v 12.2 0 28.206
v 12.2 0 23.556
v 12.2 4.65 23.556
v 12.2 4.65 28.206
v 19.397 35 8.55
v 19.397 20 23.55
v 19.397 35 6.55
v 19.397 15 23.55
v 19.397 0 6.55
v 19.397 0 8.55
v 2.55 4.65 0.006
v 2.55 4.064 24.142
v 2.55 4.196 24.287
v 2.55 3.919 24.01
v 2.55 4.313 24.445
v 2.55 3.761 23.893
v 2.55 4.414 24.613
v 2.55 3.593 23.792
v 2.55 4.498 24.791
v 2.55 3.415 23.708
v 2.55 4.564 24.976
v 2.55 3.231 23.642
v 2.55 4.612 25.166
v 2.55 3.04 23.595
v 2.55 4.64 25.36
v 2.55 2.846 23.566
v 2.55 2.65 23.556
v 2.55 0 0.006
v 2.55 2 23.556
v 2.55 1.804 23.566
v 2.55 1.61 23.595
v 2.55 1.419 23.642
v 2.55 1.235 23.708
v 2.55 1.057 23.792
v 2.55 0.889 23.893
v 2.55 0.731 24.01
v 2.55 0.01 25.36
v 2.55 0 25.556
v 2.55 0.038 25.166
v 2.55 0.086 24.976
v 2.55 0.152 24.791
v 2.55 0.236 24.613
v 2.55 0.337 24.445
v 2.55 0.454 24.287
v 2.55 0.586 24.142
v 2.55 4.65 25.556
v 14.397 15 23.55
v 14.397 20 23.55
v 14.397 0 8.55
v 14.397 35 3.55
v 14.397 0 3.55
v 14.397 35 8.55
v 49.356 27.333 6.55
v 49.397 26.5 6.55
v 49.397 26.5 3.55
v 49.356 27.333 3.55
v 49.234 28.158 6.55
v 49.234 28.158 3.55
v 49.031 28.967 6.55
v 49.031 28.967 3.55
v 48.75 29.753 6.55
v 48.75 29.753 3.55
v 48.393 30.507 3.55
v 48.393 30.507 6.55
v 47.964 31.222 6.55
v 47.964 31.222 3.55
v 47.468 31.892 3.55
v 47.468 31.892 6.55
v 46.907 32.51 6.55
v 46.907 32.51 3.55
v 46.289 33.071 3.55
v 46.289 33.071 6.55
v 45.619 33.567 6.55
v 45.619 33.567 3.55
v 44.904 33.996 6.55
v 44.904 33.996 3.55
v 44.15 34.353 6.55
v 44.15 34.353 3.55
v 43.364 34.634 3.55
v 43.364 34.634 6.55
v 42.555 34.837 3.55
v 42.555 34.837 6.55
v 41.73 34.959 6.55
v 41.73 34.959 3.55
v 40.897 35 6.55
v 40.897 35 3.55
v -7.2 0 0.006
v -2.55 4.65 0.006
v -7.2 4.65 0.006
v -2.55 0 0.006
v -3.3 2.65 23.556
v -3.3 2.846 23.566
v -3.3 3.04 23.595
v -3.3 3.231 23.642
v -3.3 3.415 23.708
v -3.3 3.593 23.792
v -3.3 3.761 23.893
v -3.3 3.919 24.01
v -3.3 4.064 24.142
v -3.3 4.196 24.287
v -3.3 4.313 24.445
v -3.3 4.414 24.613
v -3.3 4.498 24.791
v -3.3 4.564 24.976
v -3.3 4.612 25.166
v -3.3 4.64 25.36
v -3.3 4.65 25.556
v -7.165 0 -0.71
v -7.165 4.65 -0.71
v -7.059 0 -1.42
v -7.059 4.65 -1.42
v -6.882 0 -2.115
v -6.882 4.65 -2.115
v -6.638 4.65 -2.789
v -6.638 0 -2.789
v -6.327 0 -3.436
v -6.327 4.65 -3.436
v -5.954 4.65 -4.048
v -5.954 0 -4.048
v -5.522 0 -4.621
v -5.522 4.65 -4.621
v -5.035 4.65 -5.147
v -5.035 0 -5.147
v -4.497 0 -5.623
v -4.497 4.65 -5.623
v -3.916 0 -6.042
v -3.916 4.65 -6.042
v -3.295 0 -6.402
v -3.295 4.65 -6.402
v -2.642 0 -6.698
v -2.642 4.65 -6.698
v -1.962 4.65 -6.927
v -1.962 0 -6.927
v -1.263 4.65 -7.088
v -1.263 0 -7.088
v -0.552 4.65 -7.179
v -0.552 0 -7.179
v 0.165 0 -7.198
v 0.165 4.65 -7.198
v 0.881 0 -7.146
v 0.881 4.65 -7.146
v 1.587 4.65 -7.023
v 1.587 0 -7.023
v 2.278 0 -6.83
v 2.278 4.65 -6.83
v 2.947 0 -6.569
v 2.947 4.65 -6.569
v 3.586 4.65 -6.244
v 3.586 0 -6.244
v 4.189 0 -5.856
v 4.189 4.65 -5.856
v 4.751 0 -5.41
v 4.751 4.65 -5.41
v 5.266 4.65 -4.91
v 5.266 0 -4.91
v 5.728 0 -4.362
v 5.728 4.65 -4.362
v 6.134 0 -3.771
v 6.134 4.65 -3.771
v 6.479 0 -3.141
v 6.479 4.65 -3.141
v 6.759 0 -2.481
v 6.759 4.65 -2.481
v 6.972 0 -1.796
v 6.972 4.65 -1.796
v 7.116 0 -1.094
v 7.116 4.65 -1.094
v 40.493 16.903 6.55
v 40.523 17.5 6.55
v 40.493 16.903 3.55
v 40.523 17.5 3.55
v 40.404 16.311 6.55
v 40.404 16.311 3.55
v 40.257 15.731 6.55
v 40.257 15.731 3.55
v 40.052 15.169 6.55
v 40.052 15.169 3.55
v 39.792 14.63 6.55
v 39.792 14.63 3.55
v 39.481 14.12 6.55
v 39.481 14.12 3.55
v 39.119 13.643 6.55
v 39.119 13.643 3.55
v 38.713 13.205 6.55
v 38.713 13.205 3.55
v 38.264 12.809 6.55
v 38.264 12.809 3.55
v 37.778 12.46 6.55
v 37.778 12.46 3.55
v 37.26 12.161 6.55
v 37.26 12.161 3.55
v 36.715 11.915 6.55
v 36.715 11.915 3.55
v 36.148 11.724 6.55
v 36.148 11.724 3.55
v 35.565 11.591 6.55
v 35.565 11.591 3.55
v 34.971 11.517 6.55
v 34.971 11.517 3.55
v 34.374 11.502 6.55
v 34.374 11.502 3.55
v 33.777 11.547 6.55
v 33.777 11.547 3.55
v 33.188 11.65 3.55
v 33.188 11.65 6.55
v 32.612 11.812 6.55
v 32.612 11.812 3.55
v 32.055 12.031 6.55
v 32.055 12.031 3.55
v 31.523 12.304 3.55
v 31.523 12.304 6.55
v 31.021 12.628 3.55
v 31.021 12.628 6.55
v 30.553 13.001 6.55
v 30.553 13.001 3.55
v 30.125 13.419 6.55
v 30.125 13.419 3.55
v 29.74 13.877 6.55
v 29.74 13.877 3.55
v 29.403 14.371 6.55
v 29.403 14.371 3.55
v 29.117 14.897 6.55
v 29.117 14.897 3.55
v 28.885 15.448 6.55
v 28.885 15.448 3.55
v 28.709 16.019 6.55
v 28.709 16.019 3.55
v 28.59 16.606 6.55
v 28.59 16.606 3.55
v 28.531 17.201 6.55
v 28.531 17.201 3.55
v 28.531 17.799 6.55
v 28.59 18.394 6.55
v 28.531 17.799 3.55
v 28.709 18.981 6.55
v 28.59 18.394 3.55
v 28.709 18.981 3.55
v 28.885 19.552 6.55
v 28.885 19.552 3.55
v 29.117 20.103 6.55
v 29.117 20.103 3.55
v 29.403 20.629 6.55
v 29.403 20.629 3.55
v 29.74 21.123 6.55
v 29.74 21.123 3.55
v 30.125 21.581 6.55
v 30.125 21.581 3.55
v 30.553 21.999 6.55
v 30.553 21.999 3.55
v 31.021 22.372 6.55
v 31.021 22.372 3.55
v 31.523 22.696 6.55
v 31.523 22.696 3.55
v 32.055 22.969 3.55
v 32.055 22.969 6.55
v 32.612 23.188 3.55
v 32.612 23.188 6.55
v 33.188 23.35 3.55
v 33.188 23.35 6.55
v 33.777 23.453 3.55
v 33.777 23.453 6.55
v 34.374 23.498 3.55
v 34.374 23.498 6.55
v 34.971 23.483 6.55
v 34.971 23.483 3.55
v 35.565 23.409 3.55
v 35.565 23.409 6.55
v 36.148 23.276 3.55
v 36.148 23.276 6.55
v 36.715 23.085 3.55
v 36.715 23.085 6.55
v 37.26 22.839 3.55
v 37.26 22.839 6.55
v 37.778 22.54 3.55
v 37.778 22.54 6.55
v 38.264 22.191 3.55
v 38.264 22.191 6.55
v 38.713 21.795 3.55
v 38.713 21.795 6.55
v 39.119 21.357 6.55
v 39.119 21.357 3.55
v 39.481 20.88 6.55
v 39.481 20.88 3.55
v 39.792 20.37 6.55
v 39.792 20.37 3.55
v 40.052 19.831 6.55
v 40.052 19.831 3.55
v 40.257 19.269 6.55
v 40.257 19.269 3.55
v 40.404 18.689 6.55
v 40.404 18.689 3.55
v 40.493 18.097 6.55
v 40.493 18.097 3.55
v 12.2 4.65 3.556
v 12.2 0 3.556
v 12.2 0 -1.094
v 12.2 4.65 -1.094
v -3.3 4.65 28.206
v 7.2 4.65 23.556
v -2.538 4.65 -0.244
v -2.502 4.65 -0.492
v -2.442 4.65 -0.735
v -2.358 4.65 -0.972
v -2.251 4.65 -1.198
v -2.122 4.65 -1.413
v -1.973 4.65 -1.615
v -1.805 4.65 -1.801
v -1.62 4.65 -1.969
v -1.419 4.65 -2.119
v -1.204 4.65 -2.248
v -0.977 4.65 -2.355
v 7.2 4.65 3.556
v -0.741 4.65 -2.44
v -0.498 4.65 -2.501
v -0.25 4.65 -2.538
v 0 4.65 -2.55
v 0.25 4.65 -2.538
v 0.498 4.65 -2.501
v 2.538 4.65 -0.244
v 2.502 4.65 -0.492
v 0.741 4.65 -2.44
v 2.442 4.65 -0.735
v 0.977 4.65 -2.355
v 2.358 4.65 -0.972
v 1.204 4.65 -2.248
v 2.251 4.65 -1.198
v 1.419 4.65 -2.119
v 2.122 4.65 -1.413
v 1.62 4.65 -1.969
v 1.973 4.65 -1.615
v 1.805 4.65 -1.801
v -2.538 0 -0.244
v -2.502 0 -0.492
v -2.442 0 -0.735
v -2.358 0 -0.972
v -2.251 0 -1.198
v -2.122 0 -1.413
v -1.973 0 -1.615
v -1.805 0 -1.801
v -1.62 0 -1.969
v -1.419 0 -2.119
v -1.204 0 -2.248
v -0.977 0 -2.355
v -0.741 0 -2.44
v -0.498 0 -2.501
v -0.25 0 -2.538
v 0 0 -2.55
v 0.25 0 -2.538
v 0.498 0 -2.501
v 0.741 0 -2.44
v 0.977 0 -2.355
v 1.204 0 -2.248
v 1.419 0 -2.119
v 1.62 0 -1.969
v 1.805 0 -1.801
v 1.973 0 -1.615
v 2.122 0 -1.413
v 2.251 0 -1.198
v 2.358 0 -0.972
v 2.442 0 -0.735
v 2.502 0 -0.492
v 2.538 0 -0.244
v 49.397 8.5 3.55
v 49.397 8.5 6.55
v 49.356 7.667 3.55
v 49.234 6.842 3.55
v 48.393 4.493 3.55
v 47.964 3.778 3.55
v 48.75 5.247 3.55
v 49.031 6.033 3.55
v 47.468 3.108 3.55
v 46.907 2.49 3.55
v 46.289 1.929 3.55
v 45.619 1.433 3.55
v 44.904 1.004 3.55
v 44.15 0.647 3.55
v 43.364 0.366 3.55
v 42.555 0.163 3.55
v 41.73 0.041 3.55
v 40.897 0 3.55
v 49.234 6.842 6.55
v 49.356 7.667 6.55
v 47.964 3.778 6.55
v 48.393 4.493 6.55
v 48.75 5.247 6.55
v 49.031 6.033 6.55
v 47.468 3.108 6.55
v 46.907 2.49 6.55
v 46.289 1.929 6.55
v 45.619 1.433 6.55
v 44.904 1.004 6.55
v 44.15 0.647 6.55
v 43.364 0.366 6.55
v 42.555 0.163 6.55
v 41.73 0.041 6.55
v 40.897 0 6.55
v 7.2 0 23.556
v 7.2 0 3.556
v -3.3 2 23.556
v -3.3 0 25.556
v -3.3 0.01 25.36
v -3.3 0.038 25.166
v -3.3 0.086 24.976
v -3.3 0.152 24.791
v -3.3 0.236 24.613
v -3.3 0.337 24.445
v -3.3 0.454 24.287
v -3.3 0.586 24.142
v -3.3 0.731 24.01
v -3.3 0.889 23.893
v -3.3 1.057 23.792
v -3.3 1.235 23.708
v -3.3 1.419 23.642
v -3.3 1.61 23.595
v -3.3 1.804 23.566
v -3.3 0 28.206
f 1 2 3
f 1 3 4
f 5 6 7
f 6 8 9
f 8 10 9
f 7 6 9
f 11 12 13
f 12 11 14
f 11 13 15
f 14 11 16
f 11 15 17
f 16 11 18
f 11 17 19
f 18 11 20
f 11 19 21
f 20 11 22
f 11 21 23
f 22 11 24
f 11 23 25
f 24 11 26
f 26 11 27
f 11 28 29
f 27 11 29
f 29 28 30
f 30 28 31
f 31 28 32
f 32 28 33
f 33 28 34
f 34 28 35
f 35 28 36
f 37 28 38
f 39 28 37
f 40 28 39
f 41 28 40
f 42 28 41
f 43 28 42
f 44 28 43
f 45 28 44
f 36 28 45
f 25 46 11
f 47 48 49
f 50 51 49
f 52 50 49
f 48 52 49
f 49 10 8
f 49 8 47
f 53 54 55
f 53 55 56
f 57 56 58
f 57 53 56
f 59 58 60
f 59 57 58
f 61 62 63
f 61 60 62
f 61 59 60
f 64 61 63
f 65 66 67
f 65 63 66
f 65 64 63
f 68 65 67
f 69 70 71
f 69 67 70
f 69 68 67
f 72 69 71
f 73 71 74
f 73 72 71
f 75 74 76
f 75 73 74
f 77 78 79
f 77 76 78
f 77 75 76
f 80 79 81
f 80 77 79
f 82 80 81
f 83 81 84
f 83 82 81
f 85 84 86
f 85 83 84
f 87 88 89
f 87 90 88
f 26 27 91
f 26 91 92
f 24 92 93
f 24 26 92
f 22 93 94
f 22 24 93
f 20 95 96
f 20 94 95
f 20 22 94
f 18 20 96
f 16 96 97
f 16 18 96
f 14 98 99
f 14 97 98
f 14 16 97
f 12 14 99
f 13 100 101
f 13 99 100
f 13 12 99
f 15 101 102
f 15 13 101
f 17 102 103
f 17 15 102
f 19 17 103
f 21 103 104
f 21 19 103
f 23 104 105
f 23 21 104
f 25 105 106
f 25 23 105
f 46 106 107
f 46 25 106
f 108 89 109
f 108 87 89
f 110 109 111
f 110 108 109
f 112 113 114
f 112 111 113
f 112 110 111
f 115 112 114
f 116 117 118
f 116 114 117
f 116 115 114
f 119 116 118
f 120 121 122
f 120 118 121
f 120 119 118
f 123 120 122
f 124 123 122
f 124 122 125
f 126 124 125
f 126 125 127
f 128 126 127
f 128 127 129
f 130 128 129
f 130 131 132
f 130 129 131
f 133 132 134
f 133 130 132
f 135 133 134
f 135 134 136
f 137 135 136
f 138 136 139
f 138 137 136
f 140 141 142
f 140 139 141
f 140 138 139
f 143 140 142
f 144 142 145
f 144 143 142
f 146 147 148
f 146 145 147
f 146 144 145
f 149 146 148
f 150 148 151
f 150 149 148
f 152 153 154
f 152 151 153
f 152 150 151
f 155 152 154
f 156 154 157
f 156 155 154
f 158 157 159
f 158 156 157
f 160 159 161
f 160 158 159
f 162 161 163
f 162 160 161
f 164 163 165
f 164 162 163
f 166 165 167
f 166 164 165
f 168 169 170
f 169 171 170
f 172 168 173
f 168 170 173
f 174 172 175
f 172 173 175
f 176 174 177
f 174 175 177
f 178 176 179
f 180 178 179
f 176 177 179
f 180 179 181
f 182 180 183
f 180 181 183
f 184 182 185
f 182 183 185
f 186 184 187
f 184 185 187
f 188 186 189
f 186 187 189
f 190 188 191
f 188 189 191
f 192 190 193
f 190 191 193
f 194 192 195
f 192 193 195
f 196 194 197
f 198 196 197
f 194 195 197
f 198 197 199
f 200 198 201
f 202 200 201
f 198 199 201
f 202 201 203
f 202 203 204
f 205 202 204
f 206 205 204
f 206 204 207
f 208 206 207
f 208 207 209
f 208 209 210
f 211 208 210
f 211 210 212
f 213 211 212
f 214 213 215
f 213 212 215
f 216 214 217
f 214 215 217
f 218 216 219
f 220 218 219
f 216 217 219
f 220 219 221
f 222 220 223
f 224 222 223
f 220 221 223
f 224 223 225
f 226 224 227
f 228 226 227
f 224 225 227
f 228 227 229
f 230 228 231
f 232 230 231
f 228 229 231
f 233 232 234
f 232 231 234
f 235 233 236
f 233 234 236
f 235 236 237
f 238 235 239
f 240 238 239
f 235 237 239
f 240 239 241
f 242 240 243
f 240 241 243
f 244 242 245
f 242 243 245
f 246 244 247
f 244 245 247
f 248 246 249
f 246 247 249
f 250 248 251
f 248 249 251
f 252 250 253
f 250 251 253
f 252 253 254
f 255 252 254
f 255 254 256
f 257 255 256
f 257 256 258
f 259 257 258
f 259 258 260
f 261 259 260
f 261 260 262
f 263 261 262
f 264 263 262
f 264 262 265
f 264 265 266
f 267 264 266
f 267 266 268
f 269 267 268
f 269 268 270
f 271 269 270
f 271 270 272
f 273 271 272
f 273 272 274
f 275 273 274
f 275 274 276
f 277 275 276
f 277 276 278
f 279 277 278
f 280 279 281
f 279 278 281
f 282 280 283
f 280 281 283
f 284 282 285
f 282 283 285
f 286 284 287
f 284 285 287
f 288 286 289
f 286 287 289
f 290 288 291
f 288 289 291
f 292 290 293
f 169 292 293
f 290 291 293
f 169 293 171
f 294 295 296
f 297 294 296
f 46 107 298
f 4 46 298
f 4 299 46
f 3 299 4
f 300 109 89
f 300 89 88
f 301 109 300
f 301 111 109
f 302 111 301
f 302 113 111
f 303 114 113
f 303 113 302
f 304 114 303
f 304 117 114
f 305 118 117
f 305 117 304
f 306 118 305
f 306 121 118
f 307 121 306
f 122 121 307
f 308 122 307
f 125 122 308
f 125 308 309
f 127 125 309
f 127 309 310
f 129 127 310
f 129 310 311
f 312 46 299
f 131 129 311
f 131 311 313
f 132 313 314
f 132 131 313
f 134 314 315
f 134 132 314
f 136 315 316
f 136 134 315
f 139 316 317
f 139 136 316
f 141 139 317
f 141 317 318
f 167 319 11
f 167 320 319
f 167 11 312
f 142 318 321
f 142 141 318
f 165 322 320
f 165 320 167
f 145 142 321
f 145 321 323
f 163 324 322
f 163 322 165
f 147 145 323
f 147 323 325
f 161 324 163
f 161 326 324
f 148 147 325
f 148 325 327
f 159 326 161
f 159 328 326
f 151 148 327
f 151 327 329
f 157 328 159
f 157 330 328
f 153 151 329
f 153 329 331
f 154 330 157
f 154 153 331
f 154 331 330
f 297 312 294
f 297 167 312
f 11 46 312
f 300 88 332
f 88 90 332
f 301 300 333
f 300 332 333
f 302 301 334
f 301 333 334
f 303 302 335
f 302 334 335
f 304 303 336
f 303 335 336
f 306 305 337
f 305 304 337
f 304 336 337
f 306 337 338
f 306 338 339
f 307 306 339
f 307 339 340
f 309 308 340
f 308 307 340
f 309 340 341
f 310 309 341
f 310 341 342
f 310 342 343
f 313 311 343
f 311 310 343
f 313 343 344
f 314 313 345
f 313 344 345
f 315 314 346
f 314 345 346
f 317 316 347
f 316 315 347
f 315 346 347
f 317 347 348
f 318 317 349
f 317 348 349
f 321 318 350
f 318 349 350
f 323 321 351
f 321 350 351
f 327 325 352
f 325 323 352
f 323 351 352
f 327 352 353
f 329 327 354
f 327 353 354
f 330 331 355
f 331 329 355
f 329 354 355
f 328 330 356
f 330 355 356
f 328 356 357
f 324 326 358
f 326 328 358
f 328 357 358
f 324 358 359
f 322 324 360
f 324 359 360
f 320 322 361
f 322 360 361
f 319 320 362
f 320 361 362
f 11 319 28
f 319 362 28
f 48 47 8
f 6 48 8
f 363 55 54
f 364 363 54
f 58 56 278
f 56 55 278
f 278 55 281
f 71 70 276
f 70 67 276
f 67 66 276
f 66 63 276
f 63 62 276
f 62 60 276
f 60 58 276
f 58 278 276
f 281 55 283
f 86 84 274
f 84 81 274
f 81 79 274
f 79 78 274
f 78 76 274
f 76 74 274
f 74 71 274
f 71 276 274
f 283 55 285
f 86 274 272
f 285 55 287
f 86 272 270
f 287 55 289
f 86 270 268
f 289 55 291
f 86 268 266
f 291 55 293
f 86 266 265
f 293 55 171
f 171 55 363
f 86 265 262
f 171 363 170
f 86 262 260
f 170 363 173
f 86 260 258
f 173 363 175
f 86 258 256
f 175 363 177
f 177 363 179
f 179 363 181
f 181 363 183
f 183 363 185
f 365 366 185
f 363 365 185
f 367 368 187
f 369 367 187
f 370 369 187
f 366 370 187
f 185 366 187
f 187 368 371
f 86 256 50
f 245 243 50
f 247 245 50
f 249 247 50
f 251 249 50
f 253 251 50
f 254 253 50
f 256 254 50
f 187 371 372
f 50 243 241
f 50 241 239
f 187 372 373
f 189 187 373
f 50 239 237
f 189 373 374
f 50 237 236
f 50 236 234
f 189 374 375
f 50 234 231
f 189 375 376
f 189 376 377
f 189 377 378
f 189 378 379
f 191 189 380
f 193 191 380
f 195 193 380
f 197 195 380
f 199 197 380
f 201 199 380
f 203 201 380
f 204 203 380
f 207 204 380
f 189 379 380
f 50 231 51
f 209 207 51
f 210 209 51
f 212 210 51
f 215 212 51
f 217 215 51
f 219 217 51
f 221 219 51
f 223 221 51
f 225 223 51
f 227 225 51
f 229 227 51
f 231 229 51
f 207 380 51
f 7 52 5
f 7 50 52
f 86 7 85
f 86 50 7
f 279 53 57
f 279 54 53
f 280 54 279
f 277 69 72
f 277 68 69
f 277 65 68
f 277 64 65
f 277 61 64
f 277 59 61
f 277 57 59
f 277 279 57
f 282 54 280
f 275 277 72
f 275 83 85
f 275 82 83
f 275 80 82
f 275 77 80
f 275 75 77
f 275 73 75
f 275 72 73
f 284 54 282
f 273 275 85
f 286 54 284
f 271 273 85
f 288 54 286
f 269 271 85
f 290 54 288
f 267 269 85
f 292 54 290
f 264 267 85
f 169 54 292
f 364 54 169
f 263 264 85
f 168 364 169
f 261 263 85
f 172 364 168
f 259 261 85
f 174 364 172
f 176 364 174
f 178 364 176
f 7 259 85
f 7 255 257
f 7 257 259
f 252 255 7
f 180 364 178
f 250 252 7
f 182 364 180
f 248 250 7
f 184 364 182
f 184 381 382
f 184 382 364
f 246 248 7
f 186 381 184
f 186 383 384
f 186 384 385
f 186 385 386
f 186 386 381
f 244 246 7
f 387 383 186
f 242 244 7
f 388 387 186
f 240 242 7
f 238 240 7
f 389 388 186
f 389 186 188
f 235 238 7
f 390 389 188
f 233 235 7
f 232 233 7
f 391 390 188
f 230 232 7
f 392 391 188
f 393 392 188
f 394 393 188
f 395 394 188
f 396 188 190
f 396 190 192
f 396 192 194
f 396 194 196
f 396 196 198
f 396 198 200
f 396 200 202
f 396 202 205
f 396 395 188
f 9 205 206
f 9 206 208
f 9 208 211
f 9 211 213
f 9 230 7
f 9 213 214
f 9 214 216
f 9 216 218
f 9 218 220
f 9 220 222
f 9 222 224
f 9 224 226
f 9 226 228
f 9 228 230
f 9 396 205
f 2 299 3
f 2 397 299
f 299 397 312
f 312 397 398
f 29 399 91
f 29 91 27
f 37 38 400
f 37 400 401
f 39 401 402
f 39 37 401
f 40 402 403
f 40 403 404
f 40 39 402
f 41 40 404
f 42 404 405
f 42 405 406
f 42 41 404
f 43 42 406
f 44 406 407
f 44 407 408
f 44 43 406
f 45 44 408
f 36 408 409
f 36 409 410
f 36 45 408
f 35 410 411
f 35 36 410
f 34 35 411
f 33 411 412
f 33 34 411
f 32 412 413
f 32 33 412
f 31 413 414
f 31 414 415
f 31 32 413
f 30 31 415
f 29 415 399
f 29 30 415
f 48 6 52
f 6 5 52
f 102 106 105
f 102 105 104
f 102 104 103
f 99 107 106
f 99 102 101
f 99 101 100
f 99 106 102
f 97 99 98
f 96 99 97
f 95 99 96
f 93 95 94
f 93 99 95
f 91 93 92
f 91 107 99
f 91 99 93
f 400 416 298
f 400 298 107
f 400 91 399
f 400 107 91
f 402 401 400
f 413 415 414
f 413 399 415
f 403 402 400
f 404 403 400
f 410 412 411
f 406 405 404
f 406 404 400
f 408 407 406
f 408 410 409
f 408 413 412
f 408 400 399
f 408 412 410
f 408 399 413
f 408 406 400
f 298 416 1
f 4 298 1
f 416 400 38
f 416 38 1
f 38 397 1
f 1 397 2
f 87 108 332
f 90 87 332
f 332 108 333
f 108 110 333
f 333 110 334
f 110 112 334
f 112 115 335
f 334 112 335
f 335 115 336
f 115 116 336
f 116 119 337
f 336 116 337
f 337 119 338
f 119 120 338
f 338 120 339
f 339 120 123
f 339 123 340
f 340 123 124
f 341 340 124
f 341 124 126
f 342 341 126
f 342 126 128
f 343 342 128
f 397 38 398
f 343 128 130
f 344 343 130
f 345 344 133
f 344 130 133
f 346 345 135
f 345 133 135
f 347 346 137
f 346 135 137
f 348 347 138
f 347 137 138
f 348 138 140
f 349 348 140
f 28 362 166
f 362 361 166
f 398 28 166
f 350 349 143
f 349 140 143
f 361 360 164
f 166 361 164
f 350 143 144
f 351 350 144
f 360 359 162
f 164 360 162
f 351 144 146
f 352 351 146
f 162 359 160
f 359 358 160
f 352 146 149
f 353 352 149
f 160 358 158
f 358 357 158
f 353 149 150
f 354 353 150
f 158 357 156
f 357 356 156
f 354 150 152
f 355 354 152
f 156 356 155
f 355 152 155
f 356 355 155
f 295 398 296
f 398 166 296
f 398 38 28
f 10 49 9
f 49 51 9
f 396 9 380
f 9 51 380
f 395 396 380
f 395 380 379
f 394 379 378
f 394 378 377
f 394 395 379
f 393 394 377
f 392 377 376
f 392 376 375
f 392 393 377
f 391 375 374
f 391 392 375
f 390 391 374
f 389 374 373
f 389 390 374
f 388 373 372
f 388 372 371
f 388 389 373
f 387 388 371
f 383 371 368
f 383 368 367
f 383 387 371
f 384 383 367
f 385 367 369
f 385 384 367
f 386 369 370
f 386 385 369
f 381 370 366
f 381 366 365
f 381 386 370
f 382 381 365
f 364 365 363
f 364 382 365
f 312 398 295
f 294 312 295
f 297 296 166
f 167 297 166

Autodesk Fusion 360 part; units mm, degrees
sketch "Sketch1" plane through (0, 0, 0) normal (0, 1, 0) x (1, 0, 0)
  circle A0 centre (0, 0) radius 7.2
  circle A1 centre (0, 0) radius 2.55
  line L0 (7.2, -0.0062) -> (2.55, -0.0062)
  line L1 (2.55, -0.0062) -> (2.55, -28.2062)
  line L2 (2.55, -28.2062) -> (7.2, -28.2062)
  line L3 (7.2, -28.2062) -> (7.2, -0.0062)
  line L4 (7.2, -28.2062) -> (-3.3, -28.2062)
  line L5 (-3.3, -28.2062) -> (-3.3, -23.5562)
  line L6 (-3.3, -23.5562) -> (7.2, -23.5562)
  line L7 (7.2, -23.5562) -> (7.2, -28.2062)
  line L8 (2.55, -0.0062) -> (-7.2, -0.0062)
  line L9 (7.2, -5.8) -> (7.2, -1.15)
  line L10 (7.2, -23.5562) -> (12.2, -23.5562)
  line L11 (12.2, -23.5562) -> (12.2, -28.2062)
  line L12 (12.2, -28.2062) -> (7.2, -28.2062)
  line L13 (7.2, -28.2062) -> (7.2, -23.5562)
  line L14 (7, -3.5562) -> (12.2, -3.5562)
  line L15 (12.2, -3.5562) -> (12.2, 1.0938)
  line L16 (12.2, 1.0938) -> (7, 1.0938)
  line L17 (7, 1.0938) -> (7, -3.5562)
  dimension "d1" = 14.4
  dimension "d2" = 5.1
  dimension "d3" = 4.65
  dimension "d4" = 28.2
  dimension "d5" = 10.5
  dimension "d21" = 5
  dimension "d37" = 5.2
  dimension "d38" = 4.65
  dimension "d39" = 20
extrude "Extrude1" add sketch "Sketch1" along normal blind 4.65 contours A0 L0 L16 L17 | A0 L3 L9 L14 L17 | A0 L0 L17 | A0 L3 L9 L14 L15 L16 | A0 L1 L3 L6 L9 L14 L17 | A0 L0 L1 L17 | A0 A1 L0 L8 L16 L17 | L1 L2 L3 L4 L6 L7 L13 | L1 L4 L5 L6 | L3 L7 L10 L11 L12 L13 makes body 1
fillet "Fillet3" radius 2 2 edges at (-0.375, 4.65, 23.5562) (-0.375, 0, 23.5562) on bodies 1
sketch "Sketch2" plane through (0, 0, 0) normal (0, 1, 0) x (1, 0, 0)
  line L0 (14.397, -23.55) -> (19.397, -23.55)
  line L1 (19.397, -23.55) -> (19.397, -3.55)
  line L2 (19.397, -3.55) -> (14.397, -3.55)
  line L3 (14.397, -3.55) -> (14.397, -23.55)
  line L4 (14.397, -3.55) -> (49.397, -3.55)
  line L5 (49.397, -3.55) -> (49.397, -6.55)
  line L6 (49.397, -6.55) -> (14.397, -6.55)
  line L7 (14.397, -6.55) -> (14.397, -3.55)
  dimension "d22" = 5
  dimension "d23" = 20
  dimension "d24" = 35
  dimension "d25" = 3
extrude "Extrude2" add sketch "Sketch2" along normal blind 35 separate body contours L1 L2 L3 L4 L6 L7 | L1 L4 L5 L6 makes body 2
extrude "Extrude3" add sketch "Sketch2" along normal blind 35 contours L0 L1 L3 L6 bodies 2
sketch "Sketch3" plane through (0, 0, 0) normal (0, 0, 1) x (1, 0, 0)
  circle A0 centre (34.5231, 17.5) radius 6
  dimension "d31" = 12
extrude "Extrude4" cut sketch "Sketch3" along normal blind 13 bodies 2
chamfer "Chamfer1" distance 15 angle 45 2 edges at (16.897, 35, 23.55) (16.897, 0, 23.55) on bodies 2
fillet "Fillet5" radius 8.5 2 edges at (49.397, 0, 5.05) (49.397, 35, 5.05) on bodies 2
